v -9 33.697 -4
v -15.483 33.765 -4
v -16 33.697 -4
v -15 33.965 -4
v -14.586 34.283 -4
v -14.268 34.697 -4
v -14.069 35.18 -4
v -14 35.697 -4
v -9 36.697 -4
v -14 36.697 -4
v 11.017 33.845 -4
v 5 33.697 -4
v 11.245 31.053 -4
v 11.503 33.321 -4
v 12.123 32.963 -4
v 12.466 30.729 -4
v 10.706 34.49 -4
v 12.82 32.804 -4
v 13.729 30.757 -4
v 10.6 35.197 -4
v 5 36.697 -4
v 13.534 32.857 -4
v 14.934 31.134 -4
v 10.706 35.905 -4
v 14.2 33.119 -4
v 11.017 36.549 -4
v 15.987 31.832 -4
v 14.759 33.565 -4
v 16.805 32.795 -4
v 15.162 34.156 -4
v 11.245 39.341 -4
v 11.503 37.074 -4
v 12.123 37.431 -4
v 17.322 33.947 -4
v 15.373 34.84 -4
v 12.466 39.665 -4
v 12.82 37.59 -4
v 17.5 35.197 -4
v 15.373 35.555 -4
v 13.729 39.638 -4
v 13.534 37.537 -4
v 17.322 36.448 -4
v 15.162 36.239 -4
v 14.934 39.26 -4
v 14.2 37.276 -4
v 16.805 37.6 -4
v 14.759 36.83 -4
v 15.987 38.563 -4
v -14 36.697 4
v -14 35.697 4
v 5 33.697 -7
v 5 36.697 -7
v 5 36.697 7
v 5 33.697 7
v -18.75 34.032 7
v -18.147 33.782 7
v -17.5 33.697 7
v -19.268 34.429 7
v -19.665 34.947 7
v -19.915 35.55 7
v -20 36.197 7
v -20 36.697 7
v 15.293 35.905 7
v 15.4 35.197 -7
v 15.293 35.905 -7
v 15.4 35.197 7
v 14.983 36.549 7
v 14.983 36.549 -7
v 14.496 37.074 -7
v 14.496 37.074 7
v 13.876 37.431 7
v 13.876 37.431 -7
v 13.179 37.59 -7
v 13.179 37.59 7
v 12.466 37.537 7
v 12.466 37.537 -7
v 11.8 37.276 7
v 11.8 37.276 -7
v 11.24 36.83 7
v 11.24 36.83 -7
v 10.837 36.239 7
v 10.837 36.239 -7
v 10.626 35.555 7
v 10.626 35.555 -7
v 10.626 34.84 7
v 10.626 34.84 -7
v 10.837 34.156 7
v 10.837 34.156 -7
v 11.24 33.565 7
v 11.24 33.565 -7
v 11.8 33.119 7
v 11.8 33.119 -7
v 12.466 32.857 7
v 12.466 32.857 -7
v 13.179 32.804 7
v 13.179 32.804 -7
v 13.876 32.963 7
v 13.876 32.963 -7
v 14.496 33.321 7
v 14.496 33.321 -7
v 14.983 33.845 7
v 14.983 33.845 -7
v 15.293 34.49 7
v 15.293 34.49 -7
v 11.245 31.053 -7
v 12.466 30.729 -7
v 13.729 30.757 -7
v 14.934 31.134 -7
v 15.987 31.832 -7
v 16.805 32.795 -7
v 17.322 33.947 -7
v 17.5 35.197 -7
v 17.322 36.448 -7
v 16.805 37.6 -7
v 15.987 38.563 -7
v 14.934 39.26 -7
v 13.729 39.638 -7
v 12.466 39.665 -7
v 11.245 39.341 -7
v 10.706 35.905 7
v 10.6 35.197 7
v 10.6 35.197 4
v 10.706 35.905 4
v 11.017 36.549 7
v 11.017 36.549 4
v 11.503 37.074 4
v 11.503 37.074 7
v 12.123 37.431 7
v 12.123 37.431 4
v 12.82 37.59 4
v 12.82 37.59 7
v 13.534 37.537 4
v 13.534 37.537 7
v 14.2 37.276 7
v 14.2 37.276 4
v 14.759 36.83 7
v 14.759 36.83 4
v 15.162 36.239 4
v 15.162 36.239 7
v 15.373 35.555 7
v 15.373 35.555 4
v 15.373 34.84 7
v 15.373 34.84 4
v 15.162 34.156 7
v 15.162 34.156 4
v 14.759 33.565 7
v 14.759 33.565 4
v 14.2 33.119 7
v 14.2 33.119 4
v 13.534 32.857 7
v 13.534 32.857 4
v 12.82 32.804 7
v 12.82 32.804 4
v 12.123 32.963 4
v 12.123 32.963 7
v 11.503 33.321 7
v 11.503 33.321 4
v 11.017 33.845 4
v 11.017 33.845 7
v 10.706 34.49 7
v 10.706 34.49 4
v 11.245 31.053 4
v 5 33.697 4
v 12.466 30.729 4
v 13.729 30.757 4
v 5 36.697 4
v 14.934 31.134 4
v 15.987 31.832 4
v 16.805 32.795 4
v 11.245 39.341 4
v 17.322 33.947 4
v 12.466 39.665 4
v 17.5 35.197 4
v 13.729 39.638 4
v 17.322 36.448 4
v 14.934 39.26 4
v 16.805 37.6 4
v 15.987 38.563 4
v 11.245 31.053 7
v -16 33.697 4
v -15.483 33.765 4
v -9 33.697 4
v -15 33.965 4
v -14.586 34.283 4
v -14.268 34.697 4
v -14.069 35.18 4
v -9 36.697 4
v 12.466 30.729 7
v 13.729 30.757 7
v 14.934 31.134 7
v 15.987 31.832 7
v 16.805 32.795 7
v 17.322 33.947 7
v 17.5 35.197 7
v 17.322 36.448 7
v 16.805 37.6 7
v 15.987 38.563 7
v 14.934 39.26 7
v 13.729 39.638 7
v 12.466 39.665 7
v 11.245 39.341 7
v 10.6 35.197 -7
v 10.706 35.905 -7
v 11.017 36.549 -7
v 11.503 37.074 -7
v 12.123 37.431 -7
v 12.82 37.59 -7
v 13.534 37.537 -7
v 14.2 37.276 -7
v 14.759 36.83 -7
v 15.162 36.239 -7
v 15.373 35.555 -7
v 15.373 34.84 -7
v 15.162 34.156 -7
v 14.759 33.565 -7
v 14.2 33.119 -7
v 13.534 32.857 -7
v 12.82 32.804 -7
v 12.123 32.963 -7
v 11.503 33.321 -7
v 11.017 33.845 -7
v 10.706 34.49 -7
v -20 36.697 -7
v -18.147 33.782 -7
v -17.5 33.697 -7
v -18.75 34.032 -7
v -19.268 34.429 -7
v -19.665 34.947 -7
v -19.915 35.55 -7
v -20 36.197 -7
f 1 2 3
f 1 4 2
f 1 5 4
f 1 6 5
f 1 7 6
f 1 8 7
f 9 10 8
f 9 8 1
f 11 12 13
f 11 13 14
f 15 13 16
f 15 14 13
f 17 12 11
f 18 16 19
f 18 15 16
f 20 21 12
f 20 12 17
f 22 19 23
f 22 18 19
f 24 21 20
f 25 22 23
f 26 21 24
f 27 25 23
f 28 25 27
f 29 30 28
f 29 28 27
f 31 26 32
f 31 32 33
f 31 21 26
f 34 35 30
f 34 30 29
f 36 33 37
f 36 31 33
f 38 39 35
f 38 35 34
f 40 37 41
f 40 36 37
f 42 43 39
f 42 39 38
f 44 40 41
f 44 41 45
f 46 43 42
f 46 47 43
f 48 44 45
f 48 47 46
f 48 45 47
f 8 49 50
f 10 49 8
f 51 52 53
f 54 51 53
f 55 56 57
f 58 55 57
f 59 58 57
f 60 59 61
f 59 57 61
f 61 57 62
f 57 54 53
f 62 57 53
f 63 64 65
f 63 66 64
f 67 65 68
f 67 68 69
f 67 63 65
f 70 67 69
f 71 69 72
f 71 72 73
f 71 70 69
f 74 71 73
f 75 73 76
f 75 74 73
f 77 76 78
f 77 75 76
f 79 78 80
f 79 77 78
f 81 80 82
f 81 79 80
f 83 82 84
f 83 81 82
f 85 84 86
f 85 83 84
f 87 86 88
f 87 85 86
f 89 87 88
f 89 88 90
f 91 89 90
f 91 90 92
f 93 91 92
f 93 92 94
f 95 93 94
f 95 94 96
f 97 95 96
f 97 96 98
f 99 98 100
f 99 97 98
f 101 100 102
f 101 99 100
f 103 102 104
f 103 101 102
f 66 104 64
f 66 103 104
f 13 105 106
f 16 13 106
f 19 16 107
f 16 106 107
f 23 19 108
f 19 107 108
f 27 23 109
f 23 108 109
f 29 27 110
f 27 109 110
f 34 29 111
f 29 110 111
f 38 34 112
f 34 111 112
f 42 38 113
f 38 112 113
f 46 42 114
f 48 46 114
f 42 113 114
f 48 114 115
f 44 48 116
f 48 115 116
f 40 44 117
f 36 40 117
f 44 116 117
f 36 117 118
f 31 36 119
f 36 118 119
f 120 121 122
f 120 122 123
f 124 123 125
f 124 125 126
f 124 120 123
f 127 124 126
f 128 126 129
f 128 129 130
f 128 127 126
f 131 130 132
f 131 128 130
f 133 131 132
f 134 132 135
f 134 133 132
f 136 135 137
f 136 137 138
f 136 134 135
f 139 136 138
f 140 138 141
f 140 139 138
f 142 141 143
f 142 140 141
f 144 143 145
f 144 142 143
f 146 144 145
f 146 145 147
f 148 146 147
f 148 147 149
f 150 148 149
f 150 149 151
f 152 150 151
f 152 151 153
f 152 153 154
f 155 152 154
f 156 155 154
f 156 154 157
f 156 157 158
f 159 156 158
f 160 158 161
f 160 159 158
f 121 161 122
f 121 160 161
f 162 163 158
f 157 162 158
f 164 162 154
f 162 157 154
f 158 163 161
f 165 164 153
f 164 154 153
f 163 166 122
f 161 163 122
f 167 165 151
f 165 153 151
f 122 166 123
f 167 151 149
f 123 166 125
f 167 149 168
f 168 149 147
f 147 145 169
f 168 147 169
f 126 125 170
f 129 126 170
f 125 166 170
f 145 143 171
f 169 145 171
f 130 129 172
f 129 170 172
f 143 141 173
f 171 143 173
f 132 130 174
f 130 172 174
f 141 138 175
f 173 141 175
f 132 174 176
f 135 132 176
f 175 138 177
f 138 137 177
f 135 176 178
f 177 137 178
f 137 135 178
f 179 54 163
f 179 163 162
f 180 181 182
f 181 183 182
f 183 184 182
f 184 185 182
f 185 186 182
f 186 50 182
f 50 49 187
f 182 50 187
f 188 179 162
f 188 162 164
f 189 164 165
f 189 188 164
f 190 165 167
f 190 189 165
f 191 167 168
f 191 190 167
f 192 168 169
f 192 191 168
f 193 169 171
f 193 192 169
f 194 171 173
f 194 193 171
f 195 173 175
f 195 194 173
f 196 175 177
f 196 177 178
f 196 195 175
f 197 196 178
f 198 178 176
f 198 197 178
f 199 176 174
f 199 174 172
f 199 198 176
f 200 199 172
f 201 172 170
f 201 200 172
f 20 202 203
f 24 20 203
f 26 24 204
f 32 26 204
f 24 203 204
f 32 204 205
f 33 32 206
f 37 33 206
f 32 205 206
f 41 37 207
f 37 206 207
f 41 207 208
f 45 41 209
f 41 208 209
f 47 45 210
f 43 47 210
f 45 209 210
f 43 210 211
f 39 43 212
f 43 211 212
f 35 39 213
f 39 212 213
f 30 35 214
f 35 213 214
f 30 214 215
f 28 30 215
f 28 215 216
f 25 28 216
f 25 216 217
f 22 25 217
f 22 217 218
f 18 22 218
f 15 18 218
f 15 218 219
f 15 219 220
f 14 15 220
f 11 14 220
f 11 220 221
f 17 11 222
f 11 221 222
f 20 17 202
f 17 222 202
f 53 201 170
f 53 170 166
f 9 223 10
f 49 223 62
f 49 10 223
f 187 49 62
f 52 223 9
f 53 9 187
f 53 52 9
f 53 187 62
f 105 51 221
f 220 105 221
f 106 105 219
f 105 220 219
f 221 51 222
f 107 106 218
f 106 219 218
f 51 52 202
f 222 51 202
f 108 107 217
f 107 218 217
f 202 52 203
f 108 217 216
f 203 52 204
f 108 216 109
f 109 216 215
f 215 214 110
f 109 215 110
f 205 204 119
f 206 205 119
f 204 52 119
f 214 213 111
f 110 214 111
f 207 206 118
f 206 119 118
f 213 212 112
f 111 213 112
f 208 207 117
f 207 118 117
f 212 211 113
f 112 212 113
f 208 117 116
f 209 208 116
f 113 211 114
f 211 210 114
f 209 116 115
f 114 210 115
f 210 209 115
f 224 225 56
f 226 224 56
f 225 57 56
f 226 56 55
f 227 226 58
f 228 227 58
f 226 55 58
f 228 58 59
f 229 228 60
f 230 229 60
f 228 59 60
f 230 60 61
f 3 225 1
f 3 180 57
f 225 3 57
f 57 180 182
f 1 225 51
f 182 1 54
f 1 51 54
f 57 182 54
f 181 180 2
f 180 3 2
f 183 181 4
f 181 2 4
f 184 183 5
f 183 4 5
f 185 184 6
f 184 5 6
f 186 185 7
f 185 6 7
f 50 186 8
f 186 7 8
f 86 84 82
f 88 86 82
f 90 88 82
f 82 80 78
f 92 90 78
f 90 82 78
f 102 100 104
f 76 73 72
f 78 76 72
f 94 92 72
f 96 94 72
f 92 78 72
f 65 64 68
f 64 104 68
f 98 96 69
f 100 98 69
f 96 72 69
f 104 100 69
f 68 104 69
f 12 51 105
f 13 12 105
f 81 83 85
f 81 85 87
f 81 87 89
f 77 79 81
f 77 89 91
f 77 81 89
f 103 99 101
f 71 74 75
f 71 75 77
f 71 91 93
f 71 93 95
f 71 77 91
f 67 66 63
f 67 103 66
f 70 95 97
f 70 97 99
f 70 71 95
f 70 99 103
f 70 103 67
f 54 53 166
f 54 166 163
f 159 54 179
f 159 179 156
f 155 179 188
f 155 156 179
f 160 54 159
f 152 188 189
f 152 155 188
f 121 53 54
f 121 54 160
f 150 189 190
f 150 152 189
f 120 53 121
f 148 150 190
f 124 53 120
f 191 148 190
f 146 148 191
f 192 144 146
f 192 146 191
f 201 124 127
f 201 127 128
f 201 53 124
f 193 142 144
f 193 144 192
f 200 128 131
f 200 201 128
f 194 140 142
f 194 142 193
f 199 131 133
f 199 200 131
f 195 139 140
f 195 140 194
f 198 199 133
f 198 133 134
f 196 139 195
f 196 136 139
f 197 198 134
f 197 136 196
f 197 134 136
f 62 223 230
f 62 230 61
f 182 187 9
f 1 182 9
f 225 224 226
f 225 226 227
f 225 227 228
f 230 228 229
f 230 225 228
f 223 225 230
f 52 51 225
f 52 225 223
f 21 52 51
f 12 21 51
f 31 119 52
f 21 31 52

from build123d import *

# Parameters (mm, degrees)
SKETCH_1_R          = 2.4
EXTRUDE_1_DEPTH     = 7
SKETCH_2_R          = 2.4
EXTRUDE_2_DEPTH     = 3
SKETCH_3_W          = 14
SKETCH_3_H          = 3
EXTRUDE_3_DEPTH     = 22
SKETCH_4_W          = 5
SKETCH_4_H          = 8
CUT_EXTRUDE_4_DEPTH = 20.779724268
FILLET_1_R          = 2
SKETCH_5_W          = 14
SKETCH_5_H          = 3
EXTRUDE_4_DEPTH     = 3
FILLET_2_R          = 2.5


with BuildPart() as part:
    # Эскиз1 → Бобышка-Вытянуть1 (new, symmetric)
    with BuildSketch(Plane.XY):
        with Locations((12.999642628, 35.197201498)):
            Circle(SKETCH_1_R)
    extrude(amount=EXTRUDE_1_DEPTH, both=True)


with BuildPart() as body_2:
    # Эскиз2 → Бобышка-Вытянуть2 (new body)
    with BuildSketch(Plane(origin=(0, 0, -7), x_dir=(-1, 0, 0), z_dir=(0, 0, -1))):
        with BuildLine():
            Line((-11.245389457, 39.341184584), (-4.999642628, 36.697201498))
            Line((-4.999642628, 36.697201498), (-4.999642628, 33.697201498))
            Line((-4.999642628, 33.697201498), (-11.245389457, 31.053218413))
            ThreePointArc((-11.245389457, 31.053218413), (-17.499642628, 35.197201498), (-11.245389457, 39.341184584))
        make_face()
        with Locations((-12.999642628, 35.197201498)):
            Circle(SKETCH_2_R, mode=Mode.SUBTRACT)
    extrude(amount=-EXTRUDE_2_DEPTH)


with BuildPart() as body_3:
    # Зеркальное отражение2: mirrored copy
    add(body_2.part.mirror(Plane.XY))


with BuildPart() as body_4:
    # Эскиз3 → Бобышка-Вытянуть3 (new body)
    with BuildSketch(Plane.ZY.offset(-4.999642628)):
        with Locations((0, 35.197201498)):
            Rectangle(SKETCH_3_W, SKETCH_3_H)
    extrude(amount=EXTRUDE_3_DEPTH)

    # Эскиз4 → Вырез-Вытянуть4 (cut, through all)
    with BuildSketch(Plane(origin=(0, 36.697201498, 0), x_dir=(1, 0, 0), z_dir=(0, 1, 0))):
        with Locations((-11.500357372, 0)):
            Rectangle(SKETCH_4_W, SKETCH_4_H)
    extrude(amount=-CUT_EXTRUDE_4_DEPTH, mode=Mode.SUBTRACT)

    # Скругление1
    fillet_1_edges = [body_4.edges().sort_by_distance(p)[0] for p in [
        (-14.000357372, 33.697201498, 0),
    ]]
    fillet(fillet_1_edges, radius=FILLET_1_R)

    # Эскиз5 → Бобышка-Вытянуть4 (add)
    with BuildSketch(Plane.ZY.offset(17.000357372)):
        with Locations((0, 35.197201498)):
            Rectangle(SKETCH_5_W, SKETCH_5_H)
    extrude(amount=EXTRUDE_4_DEPTH)

    # Скругление2
    fillet_2_edges = [body_4.edges().sort_by_distance(p)[0] for p in [
        (-20.000357372, 33.697201498, 0),
    ]]
    fillet(fillet_2_edges, radius=FILLET_2_R)


solid = Compound([part.part, body_2.part, body_3.part, body_4.part])
